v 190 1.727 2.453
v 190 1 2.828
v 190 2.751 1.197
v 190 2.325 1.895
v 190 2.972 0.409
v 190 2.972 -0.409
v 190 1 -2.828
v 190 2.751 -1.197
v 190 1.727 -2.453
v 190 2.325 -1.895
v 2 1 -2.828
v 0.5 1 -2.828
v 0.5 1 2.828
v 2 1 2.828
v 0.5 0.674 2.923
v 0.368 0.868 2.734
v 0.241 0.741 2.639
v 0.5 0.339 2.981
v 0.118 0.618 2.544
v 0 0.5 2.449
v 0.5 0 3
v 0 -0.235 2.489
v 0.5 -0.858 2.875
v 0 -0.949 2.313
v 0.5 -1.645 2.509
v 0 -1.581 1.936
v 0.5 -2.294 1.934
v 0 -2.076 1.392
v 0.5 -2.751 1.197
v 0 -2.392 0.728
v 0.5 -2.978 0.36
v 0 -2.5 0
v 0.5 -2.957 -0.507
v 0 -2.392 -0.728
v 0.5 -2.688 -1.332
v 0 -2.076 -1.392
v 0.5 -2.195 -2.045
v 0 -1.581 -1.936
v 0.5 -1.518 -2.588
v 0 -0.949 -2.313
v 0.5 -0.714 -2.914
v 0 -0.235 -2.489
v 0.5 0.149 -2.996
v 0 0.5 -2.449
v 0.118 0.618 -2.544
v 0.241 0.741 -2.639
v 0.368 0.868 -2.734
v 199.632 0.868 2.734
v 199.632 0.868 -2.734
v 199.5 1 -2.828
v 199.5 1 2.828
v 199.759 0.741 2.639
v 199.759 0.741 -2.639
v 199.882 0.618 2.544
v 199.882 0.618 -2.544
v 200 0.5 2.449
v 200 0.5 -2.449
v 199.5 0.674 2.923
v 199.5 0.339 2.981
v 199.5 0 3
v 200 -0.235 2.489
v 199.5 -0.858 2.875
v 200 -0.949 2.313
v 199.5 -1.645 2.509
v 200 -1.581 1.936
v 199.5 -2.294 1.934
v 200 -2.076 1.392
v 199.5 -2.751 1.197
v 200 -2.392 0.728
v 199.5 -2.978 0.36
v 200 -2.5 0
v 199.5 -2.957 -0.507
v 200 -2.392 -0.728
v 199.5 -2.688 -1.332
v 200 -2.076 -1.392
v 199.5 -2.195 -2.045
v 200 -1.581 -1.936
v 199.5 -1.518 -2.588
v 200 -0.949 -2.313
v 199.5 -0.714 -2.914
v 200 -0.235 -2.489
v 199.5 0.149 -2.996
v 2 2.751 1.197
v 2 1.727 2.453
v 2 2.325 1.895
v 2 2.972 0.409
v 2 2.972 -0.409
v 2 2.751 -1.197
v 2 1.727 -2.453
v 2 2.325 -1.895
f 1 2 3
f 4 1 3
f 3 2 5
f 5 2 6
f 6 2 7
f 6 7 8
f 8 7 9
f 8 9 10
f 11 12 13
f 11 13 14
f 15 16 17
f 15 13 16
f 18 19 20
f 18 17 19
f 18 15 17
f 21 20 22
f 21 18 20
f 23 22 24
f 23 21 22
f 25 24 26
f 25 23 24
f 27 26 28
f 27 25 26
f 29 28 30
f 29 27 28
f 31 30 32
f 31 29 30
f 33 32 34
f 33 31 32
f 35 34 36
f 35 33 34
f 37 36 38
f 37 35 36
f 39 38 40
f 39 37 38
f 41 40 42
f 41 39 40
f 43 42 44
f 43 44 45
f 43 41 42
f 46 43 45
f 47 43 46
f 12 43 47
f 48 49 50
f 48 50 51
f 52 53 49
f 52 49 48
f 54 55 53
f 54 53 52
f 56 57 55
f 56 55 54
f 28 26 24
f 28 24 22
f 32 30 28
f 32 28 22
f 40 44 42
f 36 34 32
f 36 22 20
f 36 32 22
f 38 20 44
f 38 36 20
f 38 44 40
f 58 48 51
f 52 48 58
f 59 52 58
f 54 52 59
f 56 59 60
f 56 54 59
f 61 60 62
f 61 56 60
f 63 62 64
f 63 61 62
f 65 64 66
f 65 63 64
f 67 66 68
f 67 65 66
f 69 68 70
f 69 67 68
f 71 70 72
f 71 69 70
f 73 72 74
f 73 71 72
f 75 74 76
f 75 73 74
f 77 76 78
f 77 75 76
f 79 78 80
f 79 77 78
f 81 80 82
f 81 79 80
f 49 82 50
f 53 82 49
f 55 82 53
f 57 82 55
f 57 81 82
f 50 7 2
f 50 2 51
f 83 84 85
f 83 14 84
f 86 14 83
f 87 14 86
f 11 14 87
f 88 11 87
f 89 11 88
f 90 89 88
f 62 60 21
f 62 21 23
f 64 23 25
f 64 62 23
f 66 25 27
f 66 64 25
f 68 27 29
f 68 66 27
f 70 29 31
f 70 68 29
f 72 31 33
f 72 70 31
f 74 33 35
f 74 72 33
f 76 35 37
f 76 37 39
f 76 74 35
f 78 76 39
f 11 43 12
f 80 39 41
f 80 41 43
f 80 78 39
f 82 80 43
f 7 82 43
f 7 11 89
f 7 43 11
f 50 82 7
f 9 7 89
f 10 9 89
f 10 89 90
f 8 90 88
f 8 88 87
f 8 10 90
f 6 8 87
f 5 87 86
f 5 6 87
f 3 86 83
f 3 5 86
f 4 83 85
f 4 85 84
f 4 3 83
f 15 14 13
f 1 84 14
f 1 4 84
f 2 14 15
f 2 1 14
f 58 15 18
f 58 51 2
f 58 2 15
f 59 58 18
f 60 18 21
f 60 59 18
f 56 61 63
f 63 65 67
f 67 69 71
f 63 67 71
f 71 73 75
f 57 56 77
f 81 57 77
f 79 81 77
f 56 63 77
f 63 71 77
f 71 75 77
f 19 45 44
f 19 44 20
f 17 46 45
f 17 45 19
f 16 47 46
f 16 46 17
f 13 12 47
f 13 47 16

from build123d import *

# Parameters (mm, degrees)
SKETCH1_W               = 200
SKETCH1_H               = 3
CUT_EXTRUDE1_DEPTH      = 201.044994939
CUT_EXTRUDE1_DEPTH_BACK = 201.044994939
SKETCH2_W               = 2
SKETCH2_H               = 2
SKETCH2_W_2             = 10
CHAMFER1_SIZE           = 0.5


with BuildPart() as part:
    # Sketch1 → Revolve1 (revolve)
    with BuildSketch(Plane.XY, mode=Mode.PRIVATE) as revolve1_sk:
        with Locations((100, 1.5)):
            Rectangle(SKETCH1_W, SKETCH1_H)
    revolve(revolve1_sk.sketch.rotate(Axis((0, 0, 0), (1, 0, 0)), 90), axis=Axis((0, 0, 0), (1, 0, 0)))

    # Sketch2 → Cut-Extrude1 (cut, two sides: drawn at the far end of the back side and taken through both)
    with BuildSketch(Plane.XY.offset(-CUT_EXTRUDE1_DEPTH_BACK)):
        with Locations((1, 2)):
            Rectangle(SKETCH2_W, SKETCH2_H)
        with Locations((195, 2)):
            Rectangle(SKETCH2_W_2, SKETCH2_H)
    extrude(amount=CUT_EXTRUDE1_DEPTH + CUT_EXTRUDE1_DEPTH_BACK, mode=Mode.SUBTRACT)

    # Chamfer1
    chamfer1_edges = [part.edges().sort_by_distance(p)[0] for p in [
        (0, 1, 0),
        (200, -2.956795679, -0.507305936),
        (200, 1, 0),
        (0, -2.956795679, -0.507305936),
    ]]
    chamfer(chamfer1_edges, length=CHAMFER1_SIZE)


solid = part.part
